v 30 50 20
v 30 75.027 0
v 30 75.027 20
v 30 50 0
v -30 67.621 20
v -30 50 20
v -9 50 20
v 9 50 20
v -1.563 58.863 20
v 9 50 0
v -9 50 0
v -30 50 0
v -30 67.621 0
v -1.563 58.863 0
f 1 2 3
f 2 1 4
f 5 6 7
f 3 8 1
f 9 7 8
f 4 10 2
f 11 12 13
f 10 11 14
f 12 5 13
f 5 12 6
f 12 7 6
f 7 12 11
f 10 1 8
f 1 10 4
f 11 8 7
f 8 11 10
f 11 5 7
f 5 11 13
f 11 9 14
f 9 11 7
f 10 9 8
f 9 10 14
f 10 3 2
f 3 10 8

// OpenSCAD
translate([-30,50,0])
scale([3,3,1])
rotate([0,0,0]) {
    difference() {
        cube([20, 20, 20]);
        translate([7, 0, -1]) {
            rotate([0,0,50]) {
                cube([30, 30, 30]);
            }
        }
        translate([13, 0, -1]) {
            rotate([0,0,50]) {
                cube([30, 30, 30]);
            }
        }
    }
}
